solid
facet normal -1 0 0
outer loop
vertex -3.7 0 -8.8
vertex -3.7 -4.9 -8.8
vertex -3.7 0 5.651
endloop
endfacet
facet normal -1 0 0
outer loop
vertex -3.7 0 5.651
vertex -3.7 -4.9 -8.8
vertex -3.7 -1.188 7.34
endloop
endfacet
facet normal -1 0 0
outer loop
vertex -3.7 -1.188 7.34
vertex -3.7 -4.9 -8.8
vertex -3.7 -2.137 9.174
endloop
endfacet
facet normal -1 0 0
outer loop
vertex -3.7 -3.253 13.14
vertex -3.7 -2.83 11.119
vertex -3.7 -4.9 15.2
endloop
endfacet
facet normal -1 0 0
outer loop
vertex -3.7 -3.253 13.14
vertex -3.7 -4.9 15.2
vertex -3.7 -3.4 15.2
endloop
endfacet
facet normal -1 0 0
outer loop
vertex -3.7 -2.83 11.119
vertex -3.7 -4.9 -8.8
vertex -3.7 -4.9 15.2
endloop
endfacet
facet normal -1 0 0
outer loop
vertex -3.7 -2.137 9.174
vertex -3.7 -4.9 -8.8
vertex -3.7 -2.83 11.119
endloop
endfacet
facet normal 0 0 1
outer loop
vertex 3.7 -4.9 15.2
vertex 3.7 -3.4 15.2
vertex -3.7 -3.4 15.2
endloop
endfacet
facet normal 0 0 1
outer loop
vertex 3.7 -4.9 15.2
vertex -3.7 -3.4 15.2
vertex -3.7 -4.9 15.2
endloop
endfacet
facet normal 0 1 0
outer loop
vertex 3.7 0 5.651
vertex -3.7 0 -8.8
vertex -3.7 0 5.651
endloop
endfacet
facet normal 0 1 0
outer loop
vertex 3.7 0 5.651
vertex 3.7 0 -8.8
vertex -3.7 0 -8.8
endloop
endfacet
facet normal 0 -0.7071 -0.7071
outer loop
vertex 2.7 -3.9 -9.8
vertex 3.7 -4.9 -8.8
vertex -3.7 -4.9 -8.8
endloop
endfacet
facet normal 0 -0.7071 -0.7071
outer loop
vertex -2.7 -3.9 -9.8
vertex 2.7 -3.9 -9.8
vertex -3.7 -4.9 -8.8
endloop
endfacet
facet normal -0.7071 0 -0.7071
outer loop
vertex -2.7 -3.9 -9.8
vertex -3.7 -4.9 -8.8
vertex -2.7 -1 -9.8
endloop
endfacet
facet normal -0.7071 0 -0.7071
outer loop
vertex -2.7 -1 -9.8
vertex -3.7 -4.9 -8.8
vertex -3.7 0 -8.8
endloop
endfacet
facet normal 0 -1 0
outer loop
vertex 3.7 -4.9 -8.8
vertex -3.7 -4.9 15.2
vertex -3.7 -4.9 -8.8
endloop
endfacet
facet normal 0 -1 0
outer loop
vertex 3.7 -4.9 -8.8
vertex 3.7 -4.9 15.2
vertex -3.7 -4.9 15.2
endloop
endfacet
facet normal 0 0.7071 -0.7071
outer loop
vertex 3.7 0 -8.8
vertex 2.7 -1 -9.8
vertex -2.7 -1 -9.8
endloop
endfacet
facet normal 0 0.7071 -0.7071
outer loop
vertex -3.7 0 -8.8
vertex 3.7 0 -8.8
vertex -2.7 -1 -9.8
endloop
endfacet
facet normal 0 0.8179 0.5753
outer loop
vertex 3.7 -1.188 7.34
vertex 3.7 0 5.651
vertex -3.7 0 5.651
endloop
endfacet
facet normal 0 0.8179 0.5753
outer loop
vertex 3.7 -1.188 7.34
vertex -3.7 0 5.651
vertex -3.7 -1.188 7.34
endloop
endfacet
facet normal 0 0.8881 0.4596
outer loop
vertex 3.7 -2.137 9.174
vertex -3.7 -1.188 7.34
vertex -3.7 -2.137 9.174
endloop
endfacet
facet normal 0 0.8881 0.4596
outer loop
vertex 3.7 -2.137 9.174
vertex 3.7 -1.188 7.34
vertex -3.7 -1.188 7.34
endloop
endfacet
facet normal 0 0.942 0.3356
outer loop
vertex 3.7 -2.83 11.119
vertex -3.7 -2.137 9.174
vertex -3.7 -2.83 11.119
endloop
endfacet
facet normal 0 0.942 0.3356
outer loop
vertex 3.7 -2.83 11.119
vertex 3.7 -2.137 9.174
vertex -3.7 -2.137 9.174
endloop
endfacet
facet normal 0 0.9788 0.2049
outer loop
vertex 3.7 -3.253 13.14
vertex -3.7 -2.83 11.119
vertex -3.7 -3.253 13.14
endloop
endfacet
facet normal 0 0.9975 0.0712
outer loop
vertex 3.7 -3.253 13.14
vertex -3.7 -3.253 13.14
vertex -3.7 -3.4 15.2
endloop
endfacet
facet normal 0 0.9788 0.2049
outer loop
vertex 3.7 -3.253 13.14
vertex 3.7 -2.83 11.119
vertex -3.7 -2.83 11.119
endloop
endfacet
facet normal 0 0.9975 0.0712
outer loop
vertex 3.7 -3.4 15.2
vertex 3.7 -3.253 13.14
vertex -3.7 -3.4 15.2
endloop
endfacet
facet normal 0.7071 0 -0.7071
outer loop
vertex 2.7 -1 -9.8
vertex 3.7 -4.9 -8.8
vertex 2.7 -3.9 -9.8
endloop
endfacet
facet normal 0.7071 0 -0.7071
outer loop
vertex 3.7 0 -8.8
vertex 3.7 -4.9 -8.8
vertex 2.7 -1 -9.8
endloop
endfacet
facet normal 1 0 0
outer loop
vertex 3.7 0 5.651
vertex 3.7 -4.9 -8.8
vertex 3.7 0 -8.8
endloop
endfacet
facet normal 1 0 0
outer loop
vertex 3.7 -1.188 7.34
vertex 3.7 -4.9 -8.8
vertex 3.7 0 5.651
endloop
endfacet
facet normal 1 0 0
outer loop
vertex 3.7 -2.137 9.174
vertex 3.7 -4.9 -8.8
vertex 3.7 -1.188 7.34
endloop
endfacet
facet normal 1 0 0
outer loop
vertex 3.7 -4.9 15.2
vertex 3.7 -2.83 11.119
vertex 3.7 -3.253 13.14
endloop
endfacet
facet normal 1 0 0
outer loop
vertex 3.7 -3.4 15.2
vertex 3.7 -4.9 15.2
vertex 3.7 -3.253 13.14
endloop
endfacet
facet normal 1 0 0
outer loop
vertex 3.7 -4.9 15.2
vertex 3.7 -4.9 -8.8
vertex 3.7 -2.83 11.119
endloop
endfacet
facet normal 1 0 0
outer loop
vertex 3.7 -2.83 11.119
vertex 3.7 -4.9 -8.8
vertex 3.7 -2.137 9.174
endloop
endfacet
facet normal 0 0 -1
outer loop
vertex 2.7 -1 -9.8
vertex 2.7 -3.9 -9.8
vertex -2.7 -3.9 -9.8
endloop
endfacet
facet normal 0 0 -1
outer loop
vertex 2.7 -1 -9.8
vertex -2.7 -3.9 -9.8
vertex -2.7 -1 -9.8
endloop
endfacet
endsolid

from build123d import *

# Parameters (mm, degrees)
F1_DEPTH = 3.7
F2_SIZE  = 1


with BuildPart() as f1:
    # F0 (on Right) → F1 (new body, symmetric)
    with BuildSketch(Plane.YZ):
        with BuildLine():
            Line((0, -9.8), (0, 0))
            Line((0, 0), (0, 5.650941))
            ThreePointArc((0, 5.650941), (-2.516585, 10.13472), (-3.4, 15.2))
            Line((-3.4, 15.2), (-4.9, 15.2))
            Line((-4.9, 15.2), (-4.9, -9.8))
            Line((-4.9, -9.8), (0, -9.8))
        make_face()
    extrude(amount=F1_DEPTH, both=True)

    # F2
    f2_edges = [f1.edges().sort_by_distance(p)[0] for p in [
        (0, -4.9, -9.8),
        (0, 0, -9.8),
        (3.7, -2.45, -9.8),
        (-3.7, -2.45, -9.8),
    ]]
    chamfer(f2_edges, length=F2_SIZE)


solid = f1.part
